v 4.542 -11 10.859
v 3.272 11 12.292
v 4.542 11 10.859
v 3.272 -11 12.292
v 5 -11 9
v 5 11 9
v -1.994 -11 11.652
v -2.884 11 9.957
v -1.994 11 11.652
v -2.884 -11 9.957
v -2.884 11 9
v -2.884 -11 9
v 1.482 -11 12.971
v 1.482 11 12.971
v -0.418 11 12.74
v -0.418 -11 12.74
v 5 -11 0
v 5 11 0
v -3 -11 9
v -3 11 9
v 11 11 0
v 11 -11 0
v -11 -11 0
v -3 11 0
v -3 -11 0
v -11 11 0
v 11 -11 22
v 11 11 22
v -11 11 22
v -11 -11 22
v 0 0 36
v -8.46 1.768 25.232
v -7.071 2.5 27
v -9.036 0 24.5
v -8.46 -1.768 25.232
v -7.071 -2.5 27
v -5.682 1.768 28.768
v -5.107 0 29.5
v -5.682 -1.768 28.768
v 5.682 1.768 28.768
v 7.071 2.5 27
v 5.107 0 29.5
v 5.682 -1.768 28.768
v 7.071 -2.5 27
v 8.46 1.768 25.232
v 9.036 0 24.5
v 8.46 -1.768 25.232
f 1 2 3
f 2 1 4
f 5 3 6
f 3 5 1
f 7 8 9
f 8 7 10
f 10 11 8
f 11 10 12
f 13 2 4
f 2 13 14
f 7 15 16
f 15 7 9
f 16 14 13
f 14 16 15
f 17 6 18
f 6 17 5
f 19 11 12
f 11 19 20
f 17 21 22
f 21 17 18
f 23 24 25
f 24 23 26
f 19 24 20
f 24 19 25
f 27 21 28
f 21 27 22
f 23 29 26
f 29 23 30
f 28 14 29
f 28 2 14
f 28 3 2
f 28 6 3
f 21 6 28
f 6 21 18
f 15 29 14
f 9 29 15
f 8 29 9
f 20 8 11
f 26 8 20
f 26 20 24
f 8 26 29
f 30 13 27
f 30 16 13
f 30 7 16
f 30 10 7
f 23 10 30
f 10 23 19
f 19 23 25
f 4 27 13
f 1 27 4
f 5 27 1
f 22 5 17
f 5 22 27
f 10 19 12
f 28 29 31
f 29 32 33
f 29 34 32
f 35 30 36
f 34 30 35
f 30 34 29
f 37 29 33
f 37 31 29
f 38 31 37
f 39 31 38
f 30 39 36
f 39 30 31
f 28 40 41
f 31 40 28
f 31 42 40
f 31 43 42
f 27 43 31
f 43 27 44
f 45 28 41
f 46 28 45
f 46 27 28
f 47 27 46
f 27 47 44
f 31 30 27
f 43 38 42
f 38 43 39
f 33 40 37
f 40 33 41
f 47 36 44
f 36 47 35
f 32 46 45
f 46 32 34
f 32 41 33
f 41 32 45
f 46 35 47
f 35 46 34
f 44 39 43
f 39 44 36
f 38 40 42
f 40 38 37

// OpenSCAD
difference () {
    translate ([0, 0, 11]) cube (22, center=true);
    translate ([-3, -12, 0]) {
        translate ([4, 24, 9])
            rotate (a=[90, 0, 0])
                cylinder (24, 4, 4);
        cube ([8, 24, 9]);
    }
}

difference () {
    translate ([0, 0, 22])
        rotate(45)
            cylinder (14, sqrt(242), 0, $fn=4);
    translate ([-20, 0, 27])
        rotate (a=[0, 90, 0]) cylinder (40, 2.5, 2.5);
}
